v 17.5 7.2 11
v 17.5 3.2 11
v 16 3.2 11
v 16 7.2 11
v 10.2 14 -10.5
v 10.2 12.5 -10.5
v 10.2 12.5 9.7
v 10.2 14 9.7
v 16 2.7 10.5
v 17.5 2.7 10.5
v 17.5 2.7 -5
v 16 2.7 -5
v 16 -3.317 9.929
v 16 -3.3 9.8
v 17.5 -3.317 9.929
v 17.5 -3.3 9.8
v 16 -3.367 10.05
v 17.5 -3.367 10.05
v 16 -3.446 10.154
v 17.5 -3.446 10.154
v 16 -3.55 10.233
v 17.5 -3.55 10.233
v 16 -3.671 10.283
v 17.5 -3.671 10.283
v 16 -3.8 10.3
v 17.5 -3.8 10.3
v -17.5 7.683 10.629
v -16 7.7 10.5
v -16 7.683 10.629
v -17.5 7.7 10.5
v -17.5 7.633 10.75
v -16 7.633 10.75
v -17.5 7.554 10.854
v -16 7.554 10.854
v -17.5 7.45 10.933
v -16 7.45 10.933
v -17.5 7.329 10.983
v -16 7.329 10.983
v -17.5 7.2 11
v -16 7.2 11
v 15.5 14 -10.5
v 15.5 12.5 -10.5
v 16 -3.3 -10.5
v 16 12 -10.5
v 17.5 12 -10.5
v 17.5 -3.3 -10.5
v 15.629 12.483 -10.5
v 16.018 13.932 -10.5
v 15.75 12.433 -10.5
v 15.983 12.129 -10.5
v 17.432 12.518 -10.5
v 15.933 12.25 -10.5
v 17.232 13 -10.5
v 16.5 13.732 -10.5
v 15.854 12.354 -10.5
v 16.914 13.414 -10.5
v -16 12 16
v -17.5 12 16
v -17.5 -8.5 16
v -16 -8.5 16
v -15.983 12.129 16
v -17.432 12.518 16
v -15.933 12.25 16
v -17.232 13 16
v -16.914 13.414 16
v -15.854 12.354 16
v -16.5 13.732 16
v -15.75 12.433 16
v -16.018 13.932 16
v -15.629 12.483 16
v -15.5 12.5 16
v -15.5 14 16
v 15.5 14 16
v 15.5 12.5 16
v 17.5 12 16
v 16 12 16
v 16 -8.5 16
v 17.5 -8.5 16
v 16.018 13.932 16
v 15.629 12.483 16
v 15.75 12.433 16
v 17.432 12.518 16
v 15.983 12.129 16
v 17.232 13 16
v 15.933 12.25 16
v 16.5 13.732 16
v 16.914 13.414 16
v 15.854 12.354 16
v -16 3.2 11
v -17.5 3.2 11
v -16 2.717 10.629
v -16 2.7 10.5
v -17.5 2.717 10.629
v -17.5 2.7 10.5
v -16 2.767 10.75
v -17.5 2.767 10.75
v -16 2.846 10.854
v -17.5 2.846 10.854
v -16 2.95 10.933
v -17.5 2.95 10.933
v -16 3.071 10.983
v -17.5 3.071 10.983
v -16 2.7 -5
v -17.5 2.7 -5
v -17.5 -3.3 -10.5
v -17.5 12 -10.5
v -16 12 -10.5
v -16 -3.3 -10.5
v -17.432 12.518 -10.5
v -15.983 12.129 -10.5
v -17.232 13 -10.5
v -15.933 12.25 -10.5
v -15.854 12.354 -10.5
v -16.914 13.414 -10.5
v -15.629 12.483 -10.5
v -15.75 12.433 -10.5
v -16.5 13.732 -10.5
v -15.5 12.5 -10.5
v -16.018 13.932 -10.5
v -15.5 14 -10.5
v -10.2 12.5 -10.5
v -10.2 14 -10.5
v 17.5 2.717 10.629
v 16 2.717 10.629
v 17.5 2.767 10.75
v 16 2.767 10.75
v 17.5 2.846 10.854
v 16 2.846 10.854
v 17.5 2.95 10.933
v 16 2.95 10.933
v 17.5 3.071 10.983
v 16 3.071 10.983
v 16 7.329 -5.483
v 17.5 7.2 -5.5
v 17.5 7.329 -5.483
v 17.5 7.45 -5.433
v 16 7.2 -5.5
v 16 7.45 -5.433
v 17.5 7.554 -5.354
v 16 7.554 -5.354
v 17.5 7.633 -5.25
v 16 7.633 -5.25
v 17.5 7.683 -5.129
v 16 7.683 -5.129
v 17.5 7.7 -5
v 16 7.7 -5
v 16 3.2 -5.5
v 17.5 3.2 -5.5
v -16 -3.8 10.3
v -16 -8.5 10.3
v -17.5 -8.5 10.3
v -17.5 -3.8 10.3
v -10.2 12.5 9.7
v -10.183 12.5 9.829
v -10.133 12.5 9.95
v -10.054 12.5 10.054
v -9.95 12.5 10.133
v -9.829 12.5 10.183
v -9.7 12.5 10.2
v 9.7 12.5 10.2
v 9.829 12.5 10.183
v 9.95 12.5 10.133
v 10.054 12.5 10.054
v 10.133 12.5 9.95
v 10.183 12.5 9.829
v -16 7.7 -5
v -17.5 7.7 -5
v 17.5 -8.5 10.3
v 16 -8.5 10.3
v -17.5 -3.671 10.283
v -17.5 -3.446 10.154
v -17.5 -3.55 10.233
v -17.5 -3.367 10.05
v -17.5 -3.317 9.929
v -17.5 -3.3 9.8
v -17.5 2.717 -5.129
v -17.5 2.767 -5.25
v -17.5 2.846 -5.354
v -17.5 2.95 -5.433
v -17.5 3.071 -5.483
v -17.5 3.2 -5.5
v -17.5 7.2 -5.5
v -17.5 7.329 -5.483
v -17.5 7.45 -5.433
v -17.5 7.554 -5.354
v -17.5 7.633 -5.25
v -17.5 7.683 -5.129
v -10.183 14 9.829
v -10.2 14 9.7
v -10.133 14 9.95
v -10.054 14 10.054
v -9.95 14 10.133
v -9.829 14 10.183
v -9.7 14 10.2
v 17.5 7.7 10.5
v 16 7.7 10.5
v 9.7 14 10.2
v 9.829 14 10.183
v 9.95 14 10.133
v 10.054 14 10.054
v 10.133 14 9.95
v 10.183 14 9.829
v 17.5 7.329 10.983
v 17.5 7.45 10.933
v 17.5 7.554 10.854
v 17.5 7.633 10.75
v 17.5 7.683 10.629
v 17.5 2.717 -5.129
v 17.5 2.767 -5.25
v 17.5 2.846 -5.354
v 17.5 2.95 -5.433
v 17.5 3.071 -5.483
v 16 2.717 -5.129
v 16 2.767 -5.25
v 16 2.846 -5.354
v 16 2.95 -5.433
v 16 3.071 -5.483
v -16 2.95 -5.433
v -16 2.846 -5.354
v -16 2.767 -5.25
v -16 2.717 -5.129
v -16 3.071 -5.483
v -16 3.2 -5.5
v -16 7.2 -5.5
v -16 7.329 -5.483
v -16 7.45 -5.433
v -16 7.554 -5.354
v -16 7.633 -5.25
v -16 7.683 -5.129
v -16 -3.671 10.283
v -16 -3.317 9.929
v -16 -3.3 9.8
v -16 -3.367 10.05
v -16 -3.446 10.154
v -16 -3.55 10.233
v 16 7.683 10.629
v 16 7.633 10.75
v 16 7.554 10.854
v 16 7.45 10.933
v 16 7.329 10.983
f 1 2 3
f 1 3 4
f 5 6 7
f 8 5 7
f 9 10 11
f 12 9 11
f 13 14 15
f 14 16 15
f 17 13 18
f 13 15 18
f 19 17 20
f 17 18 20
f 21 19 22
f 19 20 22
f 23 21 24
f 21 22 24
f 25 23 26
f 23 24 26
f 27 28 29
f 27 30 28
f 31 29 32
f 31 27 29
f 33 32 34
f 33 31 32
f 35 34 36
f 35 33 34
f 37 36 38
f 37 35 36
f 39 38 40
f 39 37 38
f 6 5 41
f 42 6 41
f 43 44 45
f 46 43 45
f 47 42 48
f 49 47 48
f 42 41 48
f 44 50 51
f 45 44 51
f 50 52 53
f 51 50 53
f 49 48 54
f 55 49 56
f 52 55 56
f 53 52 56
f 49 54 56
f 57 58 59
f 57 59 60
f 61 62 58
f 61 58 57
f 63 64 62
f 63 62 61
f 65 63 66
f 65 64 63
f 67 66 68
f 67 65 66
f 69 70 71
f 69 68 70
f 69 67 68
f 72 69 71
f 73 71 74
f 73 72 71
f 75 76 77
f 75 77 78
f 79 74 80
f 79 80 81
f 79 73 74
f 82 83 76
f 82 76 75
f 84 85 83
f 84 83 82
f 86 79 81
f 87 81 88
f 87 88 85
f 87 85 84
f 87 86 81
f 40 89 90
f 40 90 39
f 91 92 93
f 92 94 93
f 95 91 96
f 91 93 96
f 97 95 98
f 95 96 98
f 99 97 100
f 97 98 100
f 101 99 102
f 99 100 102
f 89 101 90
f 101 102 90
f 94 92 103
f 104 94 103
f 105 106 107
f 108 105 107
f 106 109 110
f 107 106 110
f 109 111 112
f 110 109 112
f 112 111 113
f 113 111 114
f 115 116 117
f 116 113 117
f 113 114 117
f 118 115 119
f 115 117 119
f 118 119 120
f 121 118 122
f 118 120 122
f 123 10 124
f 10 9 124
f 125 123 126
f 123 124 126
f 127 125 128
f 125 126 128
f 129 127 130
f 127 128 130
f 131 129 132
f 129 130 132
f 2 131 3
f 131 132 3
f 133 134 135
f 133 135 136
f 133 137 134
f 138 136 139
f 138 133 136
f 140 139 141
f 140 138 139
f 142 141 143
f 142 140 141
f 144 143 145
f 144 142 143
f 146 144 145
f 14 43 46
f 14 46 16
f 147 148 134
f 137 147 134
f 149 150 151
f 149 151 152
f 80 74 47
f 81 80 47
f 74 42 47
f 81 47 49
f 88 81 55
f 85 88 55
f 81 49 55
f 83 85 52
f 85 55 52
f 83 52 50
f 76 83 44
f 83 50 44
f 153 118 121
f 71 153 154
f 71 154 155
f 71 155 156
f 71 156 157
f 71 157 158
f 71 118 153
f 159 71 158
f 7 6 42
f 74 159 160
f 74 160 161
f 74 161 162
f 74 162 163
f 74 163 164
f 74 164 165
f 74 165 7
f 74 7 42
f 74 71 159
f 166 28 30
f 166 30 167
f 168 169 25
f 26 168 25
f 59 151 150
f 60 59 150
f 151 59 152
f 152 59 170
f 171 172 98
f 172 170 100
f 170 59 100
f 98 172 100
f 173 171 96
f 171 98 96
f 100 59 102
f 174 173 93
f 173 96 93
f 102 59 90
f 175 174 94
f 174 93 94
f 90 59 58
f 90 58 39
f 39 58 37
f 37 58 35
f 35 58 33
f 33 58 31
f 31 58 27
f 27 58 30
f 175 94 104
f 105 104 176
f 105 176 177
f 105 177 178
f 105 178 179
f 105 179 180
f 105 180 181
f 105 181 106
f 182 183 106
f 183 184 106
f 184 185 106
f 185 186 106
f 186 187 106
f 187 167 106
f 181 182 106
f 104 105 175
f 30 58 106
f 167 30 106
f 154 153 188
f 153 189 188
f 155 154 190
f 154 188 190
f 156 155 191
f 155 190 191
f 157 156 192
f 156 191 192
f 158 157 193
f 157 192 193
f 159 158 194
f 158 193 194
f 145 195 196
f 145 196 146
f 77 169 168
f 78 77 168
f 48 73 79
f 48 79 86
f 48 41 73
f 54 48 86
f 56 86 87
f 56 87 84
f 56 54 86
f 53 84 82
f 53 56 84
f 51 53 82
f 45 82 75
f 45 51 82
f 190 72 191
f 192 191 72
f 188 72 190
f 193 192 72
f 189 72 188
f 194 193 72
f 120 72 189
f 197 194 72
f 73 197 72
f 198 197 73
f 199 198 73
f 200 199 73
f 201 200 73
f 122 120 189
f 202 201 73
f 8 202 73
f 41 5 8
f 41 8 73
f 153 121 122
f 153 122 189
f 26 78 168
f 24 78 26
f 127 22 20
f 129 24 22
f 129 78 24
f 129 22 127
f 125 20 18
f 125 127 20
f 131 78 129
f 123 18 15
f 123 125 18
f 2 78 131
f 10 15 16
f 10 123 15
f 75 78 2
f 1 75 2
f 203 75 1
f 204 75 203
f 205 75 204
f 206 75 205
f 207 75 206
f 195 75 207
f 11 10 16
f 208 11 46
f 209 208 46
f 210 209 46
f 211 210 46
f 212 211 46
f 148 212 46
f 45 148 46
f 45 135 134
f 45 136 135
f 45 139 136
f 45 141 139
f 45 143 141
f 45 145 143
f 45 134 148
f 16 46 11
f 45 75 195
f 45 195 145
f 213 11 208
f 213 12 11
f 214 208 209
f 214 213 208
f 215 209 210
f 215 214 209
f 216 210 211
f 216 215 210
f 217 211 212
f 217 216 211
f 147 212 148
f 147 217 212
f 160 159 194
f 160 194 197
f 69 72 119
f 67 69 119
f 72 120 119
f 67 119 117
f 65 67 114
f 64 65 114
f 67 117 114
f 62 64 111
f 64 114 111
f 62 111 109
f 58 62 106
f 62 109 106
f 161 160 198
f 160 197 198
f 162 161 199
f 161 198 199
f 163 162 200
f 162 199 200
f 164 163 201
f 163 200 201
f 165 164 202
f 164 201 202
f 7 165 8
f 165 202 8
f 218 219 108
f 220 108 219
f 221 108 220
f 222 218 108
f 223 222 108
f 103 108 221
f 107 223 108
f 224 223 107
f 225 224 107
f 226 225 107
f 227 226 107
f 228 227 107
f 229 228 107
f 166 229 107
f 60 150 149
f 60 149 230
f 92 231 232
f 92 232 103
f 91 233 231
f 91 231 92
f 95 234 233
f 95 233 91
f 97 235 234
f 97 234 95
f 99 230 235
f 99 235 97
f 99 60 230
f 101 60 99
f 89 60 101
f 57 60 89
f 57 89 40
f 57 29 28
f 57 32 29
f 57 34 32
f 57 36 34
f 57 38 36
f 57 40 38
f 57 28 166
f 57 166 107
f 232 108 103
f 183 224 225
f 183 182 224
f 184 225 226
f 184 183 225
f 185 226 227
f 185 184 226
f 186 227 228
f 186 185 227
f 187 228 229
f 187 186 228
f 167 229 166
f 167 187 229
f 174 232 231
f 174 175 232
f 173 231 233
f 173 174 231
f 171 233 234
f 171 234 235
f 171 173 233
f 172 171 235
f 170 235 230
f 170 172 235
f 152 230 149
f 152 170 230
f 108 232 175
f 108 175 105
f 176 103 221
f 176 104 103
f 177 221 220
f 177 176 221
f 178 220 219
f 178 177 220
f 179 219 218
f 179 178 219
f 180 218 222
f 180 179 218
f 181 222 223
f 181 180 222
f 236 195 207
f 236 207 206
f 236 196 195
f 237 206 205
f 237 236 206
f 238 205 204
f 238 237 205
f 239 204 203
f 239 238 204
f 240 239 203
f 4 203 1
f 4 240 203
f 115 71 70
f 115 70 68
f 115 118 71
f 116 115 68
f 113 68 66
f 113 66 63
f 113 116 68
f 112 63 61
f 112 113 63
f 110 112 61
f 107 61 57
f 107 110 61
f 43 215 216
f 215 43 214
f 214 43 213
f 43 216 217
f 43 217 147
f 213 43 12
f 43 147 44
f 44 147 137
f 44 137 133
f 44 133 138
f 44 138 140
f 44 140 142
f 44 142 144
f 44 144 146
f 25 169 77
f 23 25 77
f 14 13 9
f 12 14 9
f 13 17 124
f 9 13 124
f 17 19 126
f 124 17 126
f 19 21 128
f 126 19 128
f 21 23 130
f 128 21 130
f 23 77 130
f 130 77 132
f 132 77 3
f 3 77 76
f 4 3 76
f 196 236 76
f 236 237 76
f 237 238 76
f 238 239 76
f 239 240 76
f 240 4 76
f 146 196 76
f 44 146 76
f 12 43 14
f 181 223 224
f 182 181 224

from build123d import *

# Parameters (mm, degrees)
SKETCH1_W           = 35
SKETCH1_H           = 26.5
BOSS_EXTRUDE1_DEPTH = 22.5
SKETCH2_W           = 32
SKETCH2_H           = 21
CUT_EXTRUDE1_DEPTH  = 27.5
SKETCH3_W           = 20.8
SKETCH3_H           = 5.2
CUT_EXTRUDE2_DEPTH  = 2.5
SKETCH4_W           = 20.4
SKETCH4_H           = 20.7
CUT_EXTRUDE3_DEPTH  = 2.5
SKETCH5_W           = 20.8
SKETCH5_H           = 5.2
CUT_EXTRUDE4_DEPTH  = 2.5
FILLET1_R           = 0.5
FILLET2_R           = 2
SKETCH6_W           = 16.5
SKETCH6_H           = 5
CUT_EXTRUDE5_DEPTH  = 35
FILLET3_R           = 0.5


with BuildPart() as part:
    # Sketch1 → Boss-Extrude1 (new body)
    with BuildSketch(Plane(origin=(0, 14, 0), x_dir=(1, 0, 0), z_dir=(0, 1, 0))):
        with Locations((0, -2.75)):
            Rectangle(SKETCH1_W, SKETCH1_H)
    extrude(amount=-BOSS_EXTRUDE1_DEPTH)

    # Sketch2 → Cut-Extrude1 (cut, through all)
    with BuildSketch(Plane.XY.offset(16)):
        with Locations((0, 2)):
            Rectangle(SKETCH2_W, SKETCH2_H)
    extrude(amount=-CUT_EXTRUDE1_DEPTH, mode=Mode.SUBTRACT)

    # Sketch3 → Cut-Extrude2 (cut, through all)
    with BuildSketch(Plane.ZY.offset(-16)):
        with Locations((-0.1, -5.9)):
            Rectangle(SKETCH3_W, SKETCH3_H)
    extrude(amount=-CUT_EXTRUDE2_DEPTH, mode=Mode.SUBTRACT)

    # Sketch4 → Cut-Extrude3 (cut, through all)
    with BuildSketch(Plane.XZ.offset(-12.5)):
        with Locations((0, -0.15)):
            Rectangle(SKETCH4_W, SKETCH4_H)
    extrude(amount=-CUT_EXTRUDE3_DEPTH, mode=Mode.SUBTRACT)

    # Sketch5 → Cut-Extrude4 (cut, through all)
    with BuildSketch(Plane(origin=(-16, 0, 0), x_dir=(0, 0, -1), z_dir=(1, 0, 0))):
        with Locations((0.1, -5.9)):
            Rectangle(SKETCH5_W, SKETCH5_H)
    extrude(amount=-CUT_EXTRUDE4_DEPTH, mode=Mode.SUBTRACT)

    # Fillet1
    fillet1_edges = [part.edges().sort_by_distance(p)[0] for p in [
        (-16, 12.5, 2.75),
        (16, 12.5, 2.75),
    ]]
    fillet(fillet1_edges, radius=FILLET1_R)

    # Fillet2
    fillet2_edges = [part.edges().sort_by_distance(p)[0] for p in [
        (-17.5, 14, 2.75),
        (17.5, 14, 2.75),
    ]]
    fillet(fillet2_edges, radius=FILLET2_R)

    # Sketch6 → Cut-Extrude5 (cut)
    with BuildSketch(Plane(origin=(17.5, 0, 0), x_dir=(0, 0, -1), z_dir=(1, 0, 0))):
        with Locations((-2.75, 5.2)):
            Rectangle(SKETCH6_W, SKETCH6_H)
    extrude(amount=-CUT_EXTRUDE5_DEPTH, mode=Mode.SUBTRACT)

    # Fillet3
    fillet3_edges = [part.edges().sort_by_distance(p)[0] for p in [
        (-16.75, 2.7, 11),
        (16.75, 2.7, 11),
        (-16.75, 7.7, 11),
        (16.75, 7.7, 11),
        (-16.75, 7.7, -5.5),
        (16.75, 7.7, -5.5),
        (-16.75, 2.7, -5.5),
        (16.75, 2.7, -5.5),
        (16.75, -3.3, 10.3),
        (-10.2, 13.25, 10.2),
        (10.2, 13.25, 10.2),
        (-16.75, -3.3, 10.3),
    ]]
    fillet(fillet3_edges, radius=FILLET3_R)


solid = part.part
